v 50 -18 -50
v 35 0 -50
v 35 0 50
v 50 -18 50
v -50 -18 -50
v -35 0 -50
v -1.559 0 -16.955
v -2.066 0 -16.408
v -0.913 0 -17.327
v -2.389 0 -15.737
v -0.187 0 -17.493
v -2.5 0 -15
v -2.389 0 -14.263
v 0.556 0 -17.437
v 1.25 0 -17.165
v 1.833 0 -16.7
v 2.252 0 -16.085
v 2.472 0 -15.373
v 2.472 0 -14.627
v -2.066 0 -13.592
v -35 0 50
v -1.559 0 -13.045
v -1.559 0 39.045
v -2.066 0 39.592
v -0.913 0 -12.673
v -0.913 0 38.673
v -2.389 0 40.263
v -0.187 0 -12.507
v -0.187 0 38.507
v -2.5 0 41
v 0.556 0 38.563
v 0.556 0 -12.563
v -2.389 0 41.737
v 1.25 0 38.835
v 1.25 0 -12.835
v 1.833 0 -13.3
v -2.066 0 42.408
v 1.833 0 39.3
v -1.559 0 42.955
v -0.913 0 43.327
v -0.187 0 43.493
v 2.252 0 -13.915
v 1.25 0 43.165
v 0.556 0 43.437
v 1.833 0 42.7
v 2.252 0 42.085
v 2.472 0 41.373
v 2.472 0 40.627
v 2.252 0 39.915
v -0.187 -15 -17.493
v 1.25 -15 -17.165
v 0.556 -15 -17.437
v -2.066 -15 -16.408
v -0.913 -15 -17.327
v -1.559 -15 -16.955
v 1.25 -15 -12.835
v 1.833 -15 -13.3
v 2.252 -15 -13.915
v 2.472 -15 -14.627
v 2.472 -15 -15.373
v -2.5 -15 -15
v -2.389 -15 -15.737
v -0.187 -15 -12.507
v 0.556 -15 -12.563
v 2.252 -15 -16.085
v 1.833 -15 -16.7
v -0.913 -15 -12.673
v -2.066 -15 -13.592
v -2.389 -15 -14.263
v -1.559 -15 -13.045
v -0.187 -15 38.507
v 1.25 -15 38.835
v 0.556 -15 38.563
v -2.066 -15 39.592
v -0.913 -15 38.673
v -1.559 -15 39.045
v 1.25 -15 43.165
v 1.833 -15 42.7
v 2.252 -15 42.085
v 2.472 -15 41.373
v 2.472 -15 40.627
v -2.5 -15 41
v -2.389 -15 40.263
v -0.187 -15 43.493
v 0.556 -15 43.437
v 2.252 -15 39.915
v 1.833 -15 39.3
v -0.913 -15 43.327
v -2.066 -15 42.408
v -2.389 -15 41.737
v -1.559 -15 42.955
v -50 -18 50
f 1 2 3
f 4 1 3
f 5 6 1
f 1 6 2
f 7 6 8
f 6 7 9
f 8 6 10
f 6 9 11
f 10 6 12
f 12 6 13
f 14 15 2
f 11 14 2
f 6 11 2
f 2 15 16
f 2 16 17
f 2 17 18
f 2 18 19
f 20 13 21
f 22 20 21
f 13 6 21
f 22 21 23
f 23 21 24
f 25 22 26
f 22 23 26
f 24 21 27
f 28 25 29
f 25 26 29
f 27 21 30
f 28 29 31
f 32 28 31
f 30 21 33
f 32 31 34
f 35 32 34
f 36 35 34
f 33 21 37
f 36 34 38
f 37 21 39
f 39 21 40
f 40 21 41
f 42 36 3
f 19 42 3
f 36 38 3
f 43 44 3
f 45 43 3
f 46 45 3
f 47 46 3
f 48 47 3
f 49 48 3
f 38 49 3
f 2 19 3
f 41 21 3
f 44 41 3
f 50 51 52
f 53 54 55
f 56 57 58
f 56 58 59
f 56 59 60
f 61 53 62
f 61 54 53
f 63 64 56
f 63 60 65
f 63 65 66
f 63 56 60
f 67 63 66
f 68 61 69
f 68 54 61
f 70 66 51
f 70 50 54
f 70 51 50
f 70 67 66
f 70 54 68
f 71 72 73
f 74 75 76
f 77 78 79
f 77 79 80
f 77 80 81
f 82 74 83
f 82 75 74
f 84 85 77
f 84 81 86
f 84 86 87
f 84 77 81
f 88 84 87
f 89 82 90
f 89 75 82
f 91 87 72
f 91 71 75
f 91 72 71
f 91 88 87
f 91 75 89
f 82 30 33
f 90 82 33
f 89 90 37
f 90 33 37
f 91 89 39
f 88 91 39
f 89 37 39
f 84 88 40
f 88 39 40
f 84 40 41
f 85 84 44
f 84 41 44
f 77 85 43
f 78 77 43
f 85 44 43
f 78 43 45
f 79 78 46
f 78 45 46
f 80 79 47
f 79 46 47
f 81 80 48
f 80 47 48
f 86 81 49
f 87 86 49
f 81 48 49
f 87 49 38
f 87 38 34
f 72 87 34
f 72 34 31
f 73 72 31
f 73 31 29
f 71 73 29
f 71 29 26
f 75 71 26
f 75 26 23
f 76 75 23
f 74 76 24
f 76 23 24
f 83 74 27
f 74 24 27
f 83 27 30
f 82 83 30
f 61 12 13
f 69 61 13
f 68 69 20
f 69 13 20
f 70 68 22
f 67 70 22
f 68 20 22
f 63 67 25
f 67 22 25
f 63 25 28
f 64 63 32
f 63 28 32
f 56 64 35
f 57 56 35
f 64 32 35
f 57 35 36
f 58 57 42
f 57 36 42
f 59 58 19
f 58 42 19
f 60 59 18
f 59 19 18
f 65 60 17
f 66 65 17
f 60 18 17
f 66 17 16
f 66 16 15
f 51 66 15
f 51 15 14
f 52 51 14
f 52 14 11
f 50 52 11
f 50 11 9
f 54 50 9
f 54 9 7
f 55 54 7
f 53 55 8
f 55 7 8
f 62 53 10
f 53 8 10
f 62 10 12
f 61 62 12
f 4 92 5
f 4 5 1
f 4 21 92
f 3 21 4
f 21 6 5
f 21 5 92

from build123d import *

# Parameters (mm, degrees)
F0_W       = 100
F0_H       = 100
F1_DEPTH   = 18
F2_SIZE2   = 14.99999
F2_SIZE    = 17.99999
F2_2_SIZE2 = 14.99999
F2_2_SIZE  = 17.99999
F3_R       = 2.5
F4_DEPTH   = 15


# Not quite as in the source:
# - a fillet or chamfer is up to 0.001 mm smaller than in the source, because OpenCascade refuses the exact size


with BuildPart() as f1:
    # F0 (on Front) → F1 (new body)
    with BuildSketch(Plane.XZ):
        Rectangle(F0_W, F0_H)
    extrude(amount=F1_DEPTH)

    # F2 (size 18 and 15 in the source; OpenCascade refuses exactly that, so slightly less here)
    f2_edges = [f1.edges().sort_by_distance(p)[0] for p in [
        (50, 0, 0),
    ]]
    f2_side = f1.faces().sort_by_distance((50, -9, 0))[0]
    chamfer(f2_edges, length=F2_SIZE, length2=F2_SIZE2, reference=f2_side)

    # F2#2 (size 18 and 15 in the source; OpenCascade refuses exactly that, so slightly less here)
    f2_2_edges = [f1.edges().sort_by_distance(p)[0] for p in [
        (-50, 0, 0),
    ]]
    f2_2_side = f1.faces().sort_by_distance((-50, -9, 0))[0]
    chamfer(f2_2_edges, length=F2_2_SIZE, length2=F2_2_SIZE2, reference=f2_2_side)

    # F3 (on face) → F4 (cut)
    with BuildSketch(Plane(origin=(0, 0, 0), x_dir=(-1, 0, 0), z_dir=(0, 1, 0))):
        with Locations((0, -15)):
            Circle(F3_R)
        with Locations((0, 41)):
            Circle(F3_R)
    extrude(amount=-F4_DEPTH, mode=Mode.SUBTRACT)


solid = f1.part
